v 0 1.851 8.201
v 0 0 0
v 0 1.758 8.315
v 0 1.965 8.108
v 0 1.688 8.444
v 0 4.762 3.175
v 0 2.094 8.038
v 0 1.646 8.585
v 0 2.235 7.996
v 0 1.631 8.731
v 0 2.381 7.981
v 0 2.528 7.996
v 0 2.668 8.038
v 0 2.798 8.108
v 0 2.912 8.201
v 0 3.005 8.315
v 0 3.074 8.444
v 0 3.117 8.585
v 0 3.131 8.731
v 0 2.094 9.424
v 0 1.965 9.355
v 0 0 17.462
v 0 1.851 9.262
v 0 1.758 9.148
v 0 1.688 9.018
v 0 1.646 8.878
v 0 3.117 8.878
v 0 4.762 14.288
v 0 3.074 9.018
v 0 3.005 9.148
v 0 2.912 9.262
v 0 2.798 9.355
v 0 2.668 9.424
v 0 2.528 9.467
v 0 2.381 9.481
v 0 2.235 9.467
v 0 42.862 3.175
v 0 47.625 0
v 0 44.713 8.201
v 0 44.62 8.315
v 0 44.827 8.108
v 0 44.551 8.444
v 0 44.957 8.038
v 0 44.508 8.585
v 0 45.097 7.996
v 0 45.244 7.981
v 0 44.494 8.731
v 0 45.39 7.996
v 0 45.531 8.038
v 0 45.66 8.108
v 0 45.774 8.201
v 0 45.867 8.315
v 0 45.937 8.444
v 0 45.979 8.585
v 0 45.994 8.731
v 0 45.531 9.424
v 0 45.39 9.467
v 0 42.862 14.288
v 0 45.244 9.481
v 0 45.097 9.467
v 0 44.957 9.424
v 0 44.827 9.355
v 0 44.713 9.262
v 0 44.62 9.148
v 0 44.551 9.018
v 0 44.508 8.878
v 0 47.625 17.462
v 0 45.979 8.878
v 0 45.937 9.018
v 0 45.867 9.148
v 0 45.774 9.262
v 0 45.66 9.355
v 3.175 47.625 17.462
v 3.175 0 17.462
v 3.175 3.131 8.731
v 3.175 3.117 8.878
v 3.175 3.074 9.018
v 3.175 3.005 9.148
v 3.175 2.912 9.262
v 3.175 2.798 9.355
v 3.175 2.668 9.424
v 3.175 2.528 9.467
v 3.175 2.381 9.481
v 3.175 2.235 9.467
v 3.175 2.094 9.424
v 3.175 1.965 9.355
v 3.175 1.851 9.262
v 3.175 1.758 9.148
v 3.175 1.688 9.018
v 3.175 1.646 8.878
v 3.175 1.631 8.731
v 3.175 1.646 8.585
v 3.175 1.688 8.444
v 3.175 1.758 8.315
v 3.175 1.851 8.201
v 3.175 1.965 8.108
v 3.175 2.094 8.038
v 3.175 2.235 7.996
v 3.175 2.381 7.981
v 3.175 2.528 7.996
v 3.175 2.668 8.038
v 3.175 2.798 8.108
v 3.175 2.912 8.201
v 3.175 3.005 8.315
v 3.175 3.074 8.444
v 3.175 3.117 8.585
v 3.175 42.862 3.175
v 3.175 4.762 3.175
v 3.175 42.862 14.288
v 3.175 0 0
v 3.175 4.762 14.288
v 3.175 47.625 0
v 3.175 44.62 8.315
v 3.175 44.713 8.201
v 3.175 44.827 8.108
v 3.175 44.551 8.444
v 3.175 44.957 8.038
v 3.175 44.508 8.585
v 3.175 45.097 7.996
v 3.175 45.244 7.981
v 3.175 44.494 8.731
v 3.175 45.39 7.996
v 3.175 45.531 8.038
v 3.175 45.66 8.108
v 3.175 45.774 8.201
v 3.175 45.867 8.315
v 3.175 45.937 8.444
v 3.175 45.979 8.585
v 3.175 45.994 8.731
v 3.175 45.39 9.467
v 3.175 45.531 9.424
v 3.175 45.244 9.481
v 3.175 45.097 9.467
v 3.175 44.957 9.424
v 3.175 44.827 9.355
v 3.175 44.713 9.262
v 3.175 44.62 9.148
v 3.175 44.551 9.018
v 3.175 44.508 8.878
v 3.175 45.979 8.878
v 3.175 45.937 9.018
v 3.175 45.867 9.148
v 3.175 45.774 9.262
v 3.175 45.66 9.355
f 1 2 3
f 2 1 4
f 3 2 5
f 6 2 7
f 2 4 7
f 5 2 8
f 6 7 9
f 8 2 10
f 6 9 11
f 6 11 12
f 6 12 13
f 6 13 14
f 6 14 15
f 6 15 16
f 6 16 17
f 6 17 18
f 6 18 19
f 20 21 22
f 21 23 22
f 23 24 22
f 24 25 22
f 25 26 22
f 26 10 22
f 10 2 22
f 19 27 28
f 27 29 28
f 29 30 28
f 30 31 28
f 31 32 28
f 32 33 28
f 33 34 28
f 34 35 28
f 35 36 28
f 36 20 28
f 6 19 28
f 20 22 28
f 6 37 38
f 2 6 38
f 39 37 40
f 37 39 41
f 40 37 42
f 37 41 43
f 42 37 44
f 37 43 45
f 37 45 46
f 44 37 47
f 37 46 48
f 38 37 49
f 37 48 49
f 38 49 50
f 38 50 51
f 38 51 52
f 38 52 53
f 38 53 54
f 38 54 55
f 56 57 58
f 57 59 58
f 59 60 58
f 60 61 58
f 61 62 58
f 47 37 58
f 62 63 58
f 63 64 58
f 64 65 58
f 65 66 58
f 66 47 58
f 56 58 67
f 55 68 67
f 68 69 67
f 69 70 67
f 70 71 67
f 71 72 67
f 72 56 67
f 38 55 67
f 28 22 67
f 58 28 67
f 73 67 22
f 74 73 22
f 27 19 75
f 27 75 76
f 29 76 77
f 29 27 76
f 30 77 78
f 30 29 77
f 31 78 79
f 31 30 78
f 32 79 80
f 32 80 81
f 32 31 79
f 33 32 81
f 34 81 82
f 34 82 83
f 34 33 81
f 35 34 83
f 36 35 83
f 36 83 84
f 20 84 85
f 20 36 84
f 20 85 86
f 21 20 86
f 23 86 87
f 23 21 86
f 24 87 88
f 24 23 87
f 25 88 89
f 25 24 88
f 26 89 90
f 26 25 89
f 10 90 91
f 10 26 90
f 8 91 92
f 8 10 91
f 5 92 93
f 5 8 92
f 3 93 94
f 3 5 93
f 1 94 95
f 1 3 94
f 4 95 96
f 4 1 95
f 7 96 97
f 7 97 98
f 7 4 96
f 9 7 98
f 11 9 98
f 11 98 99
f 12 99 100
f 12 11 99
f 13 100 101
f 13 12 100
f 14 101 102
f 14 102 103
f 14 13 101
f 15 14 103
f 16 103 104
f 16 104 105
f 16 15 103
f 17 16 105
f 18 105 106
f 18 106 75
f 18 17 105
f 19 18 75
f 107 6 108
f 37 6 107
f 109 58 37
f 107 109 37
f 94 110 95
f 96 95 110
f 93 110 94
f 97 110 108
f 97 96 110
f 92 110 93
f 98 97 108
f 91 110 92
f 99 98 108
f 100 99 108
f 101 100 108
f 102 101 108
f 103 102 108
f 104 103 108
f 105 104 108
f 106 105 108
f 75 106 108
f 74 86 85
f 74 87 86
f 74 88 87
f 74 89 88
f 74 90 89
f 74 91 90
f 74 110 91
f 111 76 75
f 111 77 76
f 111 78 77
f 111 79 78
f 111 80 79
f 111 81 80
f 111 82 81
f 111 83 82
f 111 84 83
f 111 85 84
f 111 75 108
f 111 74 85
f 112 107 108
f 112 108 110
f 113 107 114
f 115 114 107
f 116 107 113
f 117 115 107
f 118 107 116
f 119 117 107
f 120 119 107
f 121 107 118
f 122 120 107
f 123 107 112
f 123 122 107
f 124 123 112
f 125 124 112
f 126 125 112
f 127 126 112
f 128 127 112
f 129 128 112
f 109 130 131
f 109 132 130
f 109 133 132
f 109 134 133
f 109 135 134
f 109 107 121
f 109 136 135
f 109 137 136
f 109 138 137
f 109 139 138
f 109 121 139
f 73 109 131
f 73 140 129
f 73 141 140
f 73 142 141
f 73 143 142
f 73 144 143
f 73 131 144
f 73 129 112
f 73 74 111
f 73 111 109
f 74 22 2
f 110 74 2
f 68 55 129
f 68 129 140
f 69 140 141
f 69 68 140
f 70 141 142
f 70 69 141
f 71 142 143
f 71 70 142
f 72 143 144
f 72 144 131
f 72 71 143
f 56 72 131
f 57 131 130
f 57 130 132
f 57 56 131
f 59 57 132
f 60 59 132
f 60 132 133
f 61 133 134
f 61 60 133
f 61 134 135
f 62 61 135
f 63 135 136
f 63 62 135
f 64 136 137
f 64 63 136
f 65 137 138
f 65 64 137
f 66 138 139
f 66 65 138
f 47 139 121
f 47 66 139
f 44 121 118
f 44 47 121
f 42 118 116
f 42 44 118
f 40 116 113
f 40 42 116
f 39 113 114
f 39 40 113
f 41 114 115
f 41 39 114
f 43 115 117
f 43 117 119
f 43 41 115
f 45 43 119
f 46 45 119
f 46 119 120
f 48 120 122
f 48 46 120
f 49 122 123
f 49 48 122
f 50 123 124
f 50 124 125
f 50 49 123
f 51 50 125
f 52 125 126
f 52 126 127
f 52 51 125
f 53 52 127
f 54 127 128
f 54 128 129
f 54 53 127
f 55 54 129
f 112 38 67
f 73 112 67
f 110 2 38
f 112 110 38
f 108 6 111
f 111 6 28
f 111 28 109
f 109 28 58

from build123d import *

# Parameters (mm, degrees)
F0_R     = 0.75
F0_W     = 38.1
F0_H     = 3.175
F1_DEPTH = 3.175


with BuildPart() as f1:
    # F0 (on Right) → F1 (new body)
    with BuildSketch(Plane.YZ):
        Polygon((0, 8.73125), (0, 0), (4.7625, 0), (4.7625, 3.175), (4.7625, 14.2875), (4.7625, 17.4625), (2.38125, 17.4625), (0, 17.4625), align=None)
        with Locations((2.38125, 8.73125)):
            Circle(F0_R, mode=Mode.SUBTRACT)
        with Locations((23.8125, 1.5875)):
            Rectangle(F0_W, F0_H)
        with Locations((23.8125, 15.875)):
            Rectangle(F0_W, F0_H)
        Polygon((42.8625, 3.175), (42.8625, 0), (47.625, 0), (47.625, 17.4625), (42.8625, 17.4625), (42.8625, 14.2875), align=None)
        with Locations((45.24375, 8.73125)):
            Circle(F0_R, mode=Mode.SUBTRACT)
    extrude(amount=F1_DEPTH)


solid = f1.part
